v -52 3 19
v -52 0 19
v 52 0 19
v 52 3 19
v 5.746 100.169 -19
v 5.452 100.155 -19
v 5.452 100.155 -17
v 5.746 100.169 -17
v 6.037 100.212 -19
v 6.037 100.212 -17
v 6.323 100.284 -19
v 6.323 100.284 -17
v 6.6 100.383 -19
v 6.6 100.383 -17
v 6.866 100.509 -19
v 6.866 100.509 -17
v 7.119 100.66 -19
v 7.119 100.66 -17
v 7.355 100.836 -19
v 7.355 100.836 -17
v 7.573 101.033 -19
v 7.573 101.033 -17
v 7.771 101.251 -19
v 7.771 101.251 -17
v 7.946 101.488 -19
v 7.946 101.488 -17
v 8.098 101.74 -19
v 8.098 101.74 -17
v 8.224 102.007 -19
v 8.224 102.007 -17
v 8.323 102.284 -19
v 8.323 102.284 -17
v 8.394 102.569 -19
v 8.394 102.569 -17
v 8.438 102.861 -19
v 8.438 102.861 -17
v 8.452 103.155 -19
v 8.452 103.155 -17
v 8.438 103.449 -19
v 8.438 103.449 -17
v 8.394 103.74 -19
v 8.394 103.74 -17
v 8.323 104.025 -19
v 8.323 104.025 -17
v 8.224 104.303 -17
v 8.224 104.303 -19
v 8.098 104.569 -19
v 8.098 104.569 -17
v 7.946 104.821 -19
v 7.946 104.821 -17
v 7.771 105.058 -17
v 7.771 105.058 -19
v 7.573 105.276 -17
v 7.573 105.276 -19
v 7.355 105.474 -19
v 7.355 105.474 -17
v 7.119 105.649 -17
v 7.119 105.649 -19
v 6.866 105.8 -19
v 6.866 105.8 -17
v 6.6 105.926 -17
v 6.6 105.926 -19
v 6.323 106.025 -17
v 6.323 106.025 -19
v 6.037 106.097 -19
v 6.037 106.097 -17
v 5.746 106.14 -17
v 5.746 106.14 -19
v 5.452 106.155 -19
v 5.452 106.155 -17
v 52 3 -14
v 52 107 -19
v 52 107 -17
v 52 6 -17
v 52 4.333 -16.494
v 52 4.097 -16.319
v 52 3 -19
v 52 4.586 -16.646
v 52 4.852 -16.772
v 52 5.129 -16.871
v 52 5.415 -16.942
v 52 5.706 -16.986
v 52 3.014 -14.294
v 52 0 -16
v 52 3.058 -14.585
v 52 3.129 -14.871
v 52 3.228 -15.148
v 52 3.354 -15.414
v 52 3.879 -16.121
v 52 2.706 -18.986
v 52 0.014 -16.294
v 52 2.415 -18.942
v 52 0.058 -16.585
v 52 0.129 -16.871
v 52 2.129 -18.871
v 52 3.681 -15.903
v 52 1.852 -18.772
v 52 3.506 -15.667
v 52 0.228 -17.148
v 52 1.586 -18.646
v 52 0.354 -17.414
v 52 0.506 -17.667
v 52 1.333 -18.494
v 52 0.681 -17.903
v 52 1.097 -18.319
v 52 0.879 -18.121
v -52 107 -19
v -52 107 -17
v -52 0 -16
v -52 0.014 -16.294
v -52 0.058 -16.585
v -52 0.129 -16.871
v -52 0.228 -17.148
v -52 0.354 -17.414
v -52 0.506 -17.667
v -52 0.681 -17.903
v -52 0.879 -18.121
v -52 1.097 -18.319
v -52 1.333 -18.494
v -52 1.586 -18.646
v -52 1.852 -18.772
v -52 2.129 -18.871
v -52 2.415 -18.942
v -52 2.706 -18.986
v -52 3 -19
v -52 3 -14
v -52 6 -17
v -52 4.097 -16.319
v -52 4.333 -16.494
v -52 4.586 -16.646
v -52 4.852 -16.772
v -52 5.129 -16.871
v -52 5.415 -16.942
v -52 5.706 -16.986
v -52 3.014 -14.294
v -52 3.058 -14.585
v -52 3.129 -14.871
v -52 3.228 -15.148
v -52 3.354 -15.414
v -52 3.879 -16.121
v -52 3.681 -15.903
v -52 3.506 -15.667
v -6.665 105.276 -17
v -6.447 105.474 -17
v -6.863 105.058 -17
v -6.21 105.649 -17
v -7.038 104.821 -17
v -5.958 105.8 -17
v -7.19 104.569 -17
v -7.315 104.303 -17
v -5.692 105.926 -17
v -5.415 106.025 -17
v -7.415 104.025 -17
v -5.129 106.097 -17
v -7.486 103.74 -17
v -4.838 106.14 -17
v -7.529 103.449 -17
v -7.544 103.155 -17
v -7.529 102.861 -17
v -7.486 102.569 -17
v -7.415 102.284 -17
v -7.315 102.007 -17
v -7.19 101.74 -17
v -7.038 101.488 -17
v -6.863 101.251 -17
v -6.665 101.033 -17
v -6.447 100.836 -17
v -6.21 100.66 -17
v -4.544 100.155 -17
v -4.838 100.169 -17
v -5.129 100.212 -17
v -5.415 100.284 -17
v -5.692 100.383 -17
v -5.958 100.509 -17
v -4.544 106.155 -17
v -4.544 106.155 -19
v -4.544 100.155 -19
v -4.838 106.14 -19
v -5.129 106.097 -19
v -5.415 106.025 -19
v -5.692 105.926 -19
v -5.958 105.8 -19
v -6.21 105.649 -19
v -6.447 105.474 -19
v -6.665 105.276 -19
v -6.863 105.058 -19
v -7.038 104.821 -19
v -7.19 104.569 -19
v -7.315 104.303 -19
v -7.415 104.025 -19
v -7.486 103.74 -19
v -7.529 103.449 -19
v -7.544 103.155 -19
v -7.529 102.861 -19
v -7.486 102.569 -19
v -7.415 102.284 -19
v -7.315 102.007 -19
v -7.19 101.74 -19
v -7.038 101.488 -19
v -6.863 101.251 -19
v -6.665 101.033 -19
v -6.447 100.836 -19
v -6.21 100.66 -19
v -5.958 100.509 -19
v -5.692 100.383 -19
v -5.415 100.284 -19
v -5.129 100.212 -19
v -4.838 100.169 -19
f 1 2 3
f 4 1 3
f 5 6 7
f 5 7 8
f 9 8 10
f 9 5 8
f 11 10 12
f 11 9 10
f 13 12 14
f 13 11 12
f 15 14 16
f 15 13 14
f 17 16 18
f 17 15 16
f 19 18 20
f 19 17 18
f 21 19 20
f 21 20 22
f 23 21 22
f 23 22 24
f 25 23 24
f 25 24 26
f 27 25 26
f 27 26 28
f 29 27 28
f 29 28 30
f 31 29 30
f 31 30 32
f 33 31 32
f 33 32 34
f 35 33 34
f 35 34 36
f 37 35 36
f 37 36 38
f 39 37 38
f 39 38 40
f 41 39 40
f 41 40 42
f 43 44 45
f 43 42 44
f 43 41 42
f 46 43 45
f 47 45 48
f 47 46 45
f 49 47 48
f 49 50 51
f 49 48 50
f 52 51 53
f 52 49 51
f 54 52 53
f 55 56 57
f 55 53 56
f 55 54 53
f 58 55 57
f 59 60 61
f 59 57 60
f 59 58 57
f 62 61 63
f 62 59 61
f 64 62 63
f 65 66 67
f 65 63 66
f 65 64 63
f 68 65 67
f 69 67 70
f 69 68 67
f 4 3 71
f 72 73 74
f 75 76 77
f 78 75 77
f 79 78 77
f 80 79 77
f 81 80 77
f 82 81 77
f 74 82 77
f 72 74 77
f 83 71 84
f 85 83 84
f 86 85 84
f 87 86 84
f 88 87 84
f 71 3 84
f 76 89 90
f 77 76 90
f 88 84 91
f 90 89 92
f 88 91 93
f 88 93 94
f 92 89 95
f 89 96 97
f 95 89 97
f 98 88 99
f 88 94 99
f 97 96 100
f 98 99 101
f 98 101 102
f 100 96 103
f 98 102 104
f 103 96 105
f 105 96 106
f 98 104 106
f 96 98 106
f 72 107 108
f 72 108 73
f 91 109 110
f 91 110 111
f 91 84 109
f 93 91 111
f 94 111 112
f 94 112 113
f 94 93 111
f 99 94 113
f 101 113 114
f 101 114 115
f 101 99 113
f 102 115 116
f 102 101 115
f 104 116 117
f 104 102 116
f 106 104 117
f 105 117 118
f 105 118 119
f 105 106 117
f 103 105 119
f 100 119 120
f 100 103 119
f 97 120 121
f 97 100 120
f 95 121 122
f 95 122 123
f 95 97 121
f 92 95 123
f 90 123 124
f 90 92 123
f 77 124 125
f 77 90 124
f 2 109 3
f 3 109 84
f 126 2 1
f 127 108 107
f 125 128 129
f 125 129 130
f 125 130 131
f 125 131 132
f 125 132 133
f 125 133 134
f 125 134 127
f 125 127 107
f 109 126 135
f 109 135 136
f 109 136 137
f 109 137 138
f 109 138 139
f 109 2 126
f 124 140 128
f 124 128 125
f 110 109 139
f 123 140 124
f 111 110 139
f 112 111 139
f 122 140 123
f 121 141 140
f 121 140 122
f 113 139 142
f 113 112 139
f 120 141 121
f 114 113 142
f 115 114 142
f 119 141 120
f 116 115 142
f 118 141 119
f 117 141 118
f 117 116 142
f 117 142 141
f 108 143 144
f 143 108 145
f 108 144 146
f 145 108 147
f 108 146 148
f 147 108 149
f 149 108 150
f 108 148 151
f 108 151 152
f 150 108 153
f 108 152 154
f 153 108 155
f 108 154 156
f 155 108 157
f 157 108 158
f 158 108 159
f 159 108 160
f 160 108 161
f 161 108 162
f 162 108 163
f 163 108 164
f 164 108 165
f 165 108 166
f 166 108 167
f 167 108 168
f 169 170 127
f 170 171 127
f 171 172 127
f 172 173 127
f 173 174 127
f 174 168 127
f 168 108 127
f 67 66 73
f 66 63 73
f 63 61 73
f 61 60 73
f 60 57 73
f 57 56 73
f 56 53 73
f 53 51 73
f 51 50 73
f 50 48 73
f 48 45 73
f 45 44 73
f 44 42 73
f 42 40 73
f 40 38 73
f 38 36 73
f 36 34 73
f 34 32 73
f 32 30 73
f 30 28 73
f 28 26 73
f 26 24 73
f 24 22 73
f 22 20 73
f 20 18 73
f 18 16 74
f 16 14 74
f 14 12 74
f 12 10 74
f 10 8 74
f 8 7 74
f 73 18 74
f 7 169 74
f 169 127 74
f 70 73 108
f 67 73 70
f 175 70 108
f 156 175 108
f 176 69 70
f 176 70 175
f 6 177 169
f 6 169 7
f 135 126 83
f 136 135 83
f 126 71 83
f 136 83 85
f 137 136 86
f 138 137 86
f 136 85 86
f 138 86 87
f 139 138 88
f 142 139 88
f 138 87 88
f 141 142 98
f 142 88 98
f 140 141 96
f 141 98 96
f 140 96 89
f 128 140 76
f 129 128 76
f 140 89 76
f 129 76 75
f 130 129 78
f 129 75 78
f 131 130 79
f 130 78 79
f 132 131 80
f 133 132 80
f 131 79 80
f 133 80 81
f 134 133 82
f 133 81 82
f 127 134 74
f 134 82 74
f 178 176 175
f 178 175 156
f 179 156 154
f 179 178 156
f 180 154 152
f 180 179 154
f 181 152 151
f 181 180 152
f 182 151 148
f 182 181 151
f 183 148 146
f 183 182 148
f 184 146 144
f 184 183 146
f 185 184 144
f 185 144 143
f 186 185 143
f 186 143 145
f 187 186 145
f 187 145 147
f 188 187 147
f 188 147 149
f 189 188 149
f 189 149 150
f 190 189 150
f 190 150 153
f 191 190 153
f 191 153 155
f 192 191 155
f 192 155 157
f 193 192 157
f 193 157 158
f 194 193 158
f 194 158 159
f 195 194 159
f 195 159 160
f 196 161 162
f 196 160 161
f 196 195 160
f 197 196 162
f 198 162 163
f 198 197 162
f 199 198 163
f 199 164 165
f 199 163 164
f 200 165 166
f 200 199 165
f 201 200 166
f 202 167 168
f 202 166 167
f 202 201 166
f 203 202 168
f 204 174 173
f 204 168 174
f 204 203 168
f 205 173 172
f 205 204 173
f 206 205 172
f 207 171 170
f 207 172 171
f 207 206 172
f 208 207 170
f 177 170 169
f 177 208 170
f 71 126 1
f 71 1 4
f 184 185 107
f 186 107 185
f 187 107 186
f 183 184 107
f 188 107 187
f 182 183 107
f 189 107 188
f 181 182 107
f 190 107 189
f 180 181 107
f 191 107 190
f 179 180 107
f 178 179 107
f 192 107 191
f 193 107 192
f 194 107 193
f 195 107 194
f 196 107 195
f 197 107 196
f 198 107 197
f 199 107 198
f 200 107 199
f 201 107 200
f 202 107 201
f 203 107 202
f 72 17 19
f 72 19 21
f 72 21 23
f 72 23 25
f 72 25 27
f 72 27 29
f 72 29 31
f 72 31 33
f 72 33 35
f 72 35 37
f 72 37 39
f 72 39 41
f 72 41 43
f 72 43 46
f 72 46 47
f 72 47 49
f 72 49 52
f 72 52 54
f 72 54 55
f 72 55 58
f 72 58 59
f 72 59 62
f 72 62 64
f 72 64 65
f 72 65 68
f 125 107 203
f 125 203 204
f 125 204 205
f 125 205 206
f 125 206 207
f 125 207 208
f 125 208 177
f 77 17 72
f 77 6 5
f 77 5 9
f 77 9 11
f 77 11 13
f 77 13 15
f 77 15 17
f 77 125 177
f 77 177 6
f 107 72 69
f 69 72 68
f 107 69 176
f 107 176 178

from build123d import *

# Parameters (mm, degrees)
SKETCH_1_W          = 104
SKETCH_1_H          = 38
EXTRUDE_1_DEPTH     = 3
SKETCH_2_W          = 104
SKETCH_2_H          = 2
EXTRUDE_3_DEPTH     = 104
FILLET_1_R          = 3
CUT_EXTRUDE_1_DEPTH = 125.887949779


with BuildPart() as part:
    # 草图1 → 凸台-拉伸1 (new body)
    with BuildSketch(Plane(origin=(0, 0, 0), x_dir=(1, 0, 0), z_dir=(0, 1, 0))):
        Rectangle(SKETCH_1_W, SKETCH_1_H)
    extrude(amount=EXTRUDE_1_DEPTH)

    # 草图2 → 凸台-拉伸3 (add)
    with BuildSketch(Plane(origin=(0, 3, 0), x_dir=(1, 0, 0), z_dir=(0, 1, 0))):
        with Locations((0, 18)):
            Rectangle(SKETCH_2_W, SKETCH_2_H)
    extrude(amount=EXTRUDE_3_DEPTH)

    # 圆角1
    fillet_1_edges = [part.edges().sort_by_distance(p)[0] for p in [
        (0, 3, -17),
        (0, 0, -19),
    ]]
    fillet(fillet_1_edges, radius=FILLET_1_R)

    # 草图4 → 切除-拉伸1 (cut, through all)
    with BuildSketch(Plane(origin=(0, 0, -19), x_dir=(-1, 0, 0), z_dir=(0, 0, -1))):
        with BuildLine():
            Line((-5.452089617, 106.154609435), (4.543778851, 106.154609435))
            ThreePointArc((4.543778851, 106.154609435), (7.543778851, 103.154609435), (4.543778851, 100.154609435))
            Line((4.543778851, 100.154609435), (-5.452089617, 100.154609435))
            ThreePointArc((-5.452089617, 100.154609435), (-8.452089617, 103.154609435), (-5.452089617, 106.154609435))
        make_face()
    extrude(amount=-CUT_EXTRUDE_1_DEPTH, mode=Mode.SUBTRACT)


solid = part.part
